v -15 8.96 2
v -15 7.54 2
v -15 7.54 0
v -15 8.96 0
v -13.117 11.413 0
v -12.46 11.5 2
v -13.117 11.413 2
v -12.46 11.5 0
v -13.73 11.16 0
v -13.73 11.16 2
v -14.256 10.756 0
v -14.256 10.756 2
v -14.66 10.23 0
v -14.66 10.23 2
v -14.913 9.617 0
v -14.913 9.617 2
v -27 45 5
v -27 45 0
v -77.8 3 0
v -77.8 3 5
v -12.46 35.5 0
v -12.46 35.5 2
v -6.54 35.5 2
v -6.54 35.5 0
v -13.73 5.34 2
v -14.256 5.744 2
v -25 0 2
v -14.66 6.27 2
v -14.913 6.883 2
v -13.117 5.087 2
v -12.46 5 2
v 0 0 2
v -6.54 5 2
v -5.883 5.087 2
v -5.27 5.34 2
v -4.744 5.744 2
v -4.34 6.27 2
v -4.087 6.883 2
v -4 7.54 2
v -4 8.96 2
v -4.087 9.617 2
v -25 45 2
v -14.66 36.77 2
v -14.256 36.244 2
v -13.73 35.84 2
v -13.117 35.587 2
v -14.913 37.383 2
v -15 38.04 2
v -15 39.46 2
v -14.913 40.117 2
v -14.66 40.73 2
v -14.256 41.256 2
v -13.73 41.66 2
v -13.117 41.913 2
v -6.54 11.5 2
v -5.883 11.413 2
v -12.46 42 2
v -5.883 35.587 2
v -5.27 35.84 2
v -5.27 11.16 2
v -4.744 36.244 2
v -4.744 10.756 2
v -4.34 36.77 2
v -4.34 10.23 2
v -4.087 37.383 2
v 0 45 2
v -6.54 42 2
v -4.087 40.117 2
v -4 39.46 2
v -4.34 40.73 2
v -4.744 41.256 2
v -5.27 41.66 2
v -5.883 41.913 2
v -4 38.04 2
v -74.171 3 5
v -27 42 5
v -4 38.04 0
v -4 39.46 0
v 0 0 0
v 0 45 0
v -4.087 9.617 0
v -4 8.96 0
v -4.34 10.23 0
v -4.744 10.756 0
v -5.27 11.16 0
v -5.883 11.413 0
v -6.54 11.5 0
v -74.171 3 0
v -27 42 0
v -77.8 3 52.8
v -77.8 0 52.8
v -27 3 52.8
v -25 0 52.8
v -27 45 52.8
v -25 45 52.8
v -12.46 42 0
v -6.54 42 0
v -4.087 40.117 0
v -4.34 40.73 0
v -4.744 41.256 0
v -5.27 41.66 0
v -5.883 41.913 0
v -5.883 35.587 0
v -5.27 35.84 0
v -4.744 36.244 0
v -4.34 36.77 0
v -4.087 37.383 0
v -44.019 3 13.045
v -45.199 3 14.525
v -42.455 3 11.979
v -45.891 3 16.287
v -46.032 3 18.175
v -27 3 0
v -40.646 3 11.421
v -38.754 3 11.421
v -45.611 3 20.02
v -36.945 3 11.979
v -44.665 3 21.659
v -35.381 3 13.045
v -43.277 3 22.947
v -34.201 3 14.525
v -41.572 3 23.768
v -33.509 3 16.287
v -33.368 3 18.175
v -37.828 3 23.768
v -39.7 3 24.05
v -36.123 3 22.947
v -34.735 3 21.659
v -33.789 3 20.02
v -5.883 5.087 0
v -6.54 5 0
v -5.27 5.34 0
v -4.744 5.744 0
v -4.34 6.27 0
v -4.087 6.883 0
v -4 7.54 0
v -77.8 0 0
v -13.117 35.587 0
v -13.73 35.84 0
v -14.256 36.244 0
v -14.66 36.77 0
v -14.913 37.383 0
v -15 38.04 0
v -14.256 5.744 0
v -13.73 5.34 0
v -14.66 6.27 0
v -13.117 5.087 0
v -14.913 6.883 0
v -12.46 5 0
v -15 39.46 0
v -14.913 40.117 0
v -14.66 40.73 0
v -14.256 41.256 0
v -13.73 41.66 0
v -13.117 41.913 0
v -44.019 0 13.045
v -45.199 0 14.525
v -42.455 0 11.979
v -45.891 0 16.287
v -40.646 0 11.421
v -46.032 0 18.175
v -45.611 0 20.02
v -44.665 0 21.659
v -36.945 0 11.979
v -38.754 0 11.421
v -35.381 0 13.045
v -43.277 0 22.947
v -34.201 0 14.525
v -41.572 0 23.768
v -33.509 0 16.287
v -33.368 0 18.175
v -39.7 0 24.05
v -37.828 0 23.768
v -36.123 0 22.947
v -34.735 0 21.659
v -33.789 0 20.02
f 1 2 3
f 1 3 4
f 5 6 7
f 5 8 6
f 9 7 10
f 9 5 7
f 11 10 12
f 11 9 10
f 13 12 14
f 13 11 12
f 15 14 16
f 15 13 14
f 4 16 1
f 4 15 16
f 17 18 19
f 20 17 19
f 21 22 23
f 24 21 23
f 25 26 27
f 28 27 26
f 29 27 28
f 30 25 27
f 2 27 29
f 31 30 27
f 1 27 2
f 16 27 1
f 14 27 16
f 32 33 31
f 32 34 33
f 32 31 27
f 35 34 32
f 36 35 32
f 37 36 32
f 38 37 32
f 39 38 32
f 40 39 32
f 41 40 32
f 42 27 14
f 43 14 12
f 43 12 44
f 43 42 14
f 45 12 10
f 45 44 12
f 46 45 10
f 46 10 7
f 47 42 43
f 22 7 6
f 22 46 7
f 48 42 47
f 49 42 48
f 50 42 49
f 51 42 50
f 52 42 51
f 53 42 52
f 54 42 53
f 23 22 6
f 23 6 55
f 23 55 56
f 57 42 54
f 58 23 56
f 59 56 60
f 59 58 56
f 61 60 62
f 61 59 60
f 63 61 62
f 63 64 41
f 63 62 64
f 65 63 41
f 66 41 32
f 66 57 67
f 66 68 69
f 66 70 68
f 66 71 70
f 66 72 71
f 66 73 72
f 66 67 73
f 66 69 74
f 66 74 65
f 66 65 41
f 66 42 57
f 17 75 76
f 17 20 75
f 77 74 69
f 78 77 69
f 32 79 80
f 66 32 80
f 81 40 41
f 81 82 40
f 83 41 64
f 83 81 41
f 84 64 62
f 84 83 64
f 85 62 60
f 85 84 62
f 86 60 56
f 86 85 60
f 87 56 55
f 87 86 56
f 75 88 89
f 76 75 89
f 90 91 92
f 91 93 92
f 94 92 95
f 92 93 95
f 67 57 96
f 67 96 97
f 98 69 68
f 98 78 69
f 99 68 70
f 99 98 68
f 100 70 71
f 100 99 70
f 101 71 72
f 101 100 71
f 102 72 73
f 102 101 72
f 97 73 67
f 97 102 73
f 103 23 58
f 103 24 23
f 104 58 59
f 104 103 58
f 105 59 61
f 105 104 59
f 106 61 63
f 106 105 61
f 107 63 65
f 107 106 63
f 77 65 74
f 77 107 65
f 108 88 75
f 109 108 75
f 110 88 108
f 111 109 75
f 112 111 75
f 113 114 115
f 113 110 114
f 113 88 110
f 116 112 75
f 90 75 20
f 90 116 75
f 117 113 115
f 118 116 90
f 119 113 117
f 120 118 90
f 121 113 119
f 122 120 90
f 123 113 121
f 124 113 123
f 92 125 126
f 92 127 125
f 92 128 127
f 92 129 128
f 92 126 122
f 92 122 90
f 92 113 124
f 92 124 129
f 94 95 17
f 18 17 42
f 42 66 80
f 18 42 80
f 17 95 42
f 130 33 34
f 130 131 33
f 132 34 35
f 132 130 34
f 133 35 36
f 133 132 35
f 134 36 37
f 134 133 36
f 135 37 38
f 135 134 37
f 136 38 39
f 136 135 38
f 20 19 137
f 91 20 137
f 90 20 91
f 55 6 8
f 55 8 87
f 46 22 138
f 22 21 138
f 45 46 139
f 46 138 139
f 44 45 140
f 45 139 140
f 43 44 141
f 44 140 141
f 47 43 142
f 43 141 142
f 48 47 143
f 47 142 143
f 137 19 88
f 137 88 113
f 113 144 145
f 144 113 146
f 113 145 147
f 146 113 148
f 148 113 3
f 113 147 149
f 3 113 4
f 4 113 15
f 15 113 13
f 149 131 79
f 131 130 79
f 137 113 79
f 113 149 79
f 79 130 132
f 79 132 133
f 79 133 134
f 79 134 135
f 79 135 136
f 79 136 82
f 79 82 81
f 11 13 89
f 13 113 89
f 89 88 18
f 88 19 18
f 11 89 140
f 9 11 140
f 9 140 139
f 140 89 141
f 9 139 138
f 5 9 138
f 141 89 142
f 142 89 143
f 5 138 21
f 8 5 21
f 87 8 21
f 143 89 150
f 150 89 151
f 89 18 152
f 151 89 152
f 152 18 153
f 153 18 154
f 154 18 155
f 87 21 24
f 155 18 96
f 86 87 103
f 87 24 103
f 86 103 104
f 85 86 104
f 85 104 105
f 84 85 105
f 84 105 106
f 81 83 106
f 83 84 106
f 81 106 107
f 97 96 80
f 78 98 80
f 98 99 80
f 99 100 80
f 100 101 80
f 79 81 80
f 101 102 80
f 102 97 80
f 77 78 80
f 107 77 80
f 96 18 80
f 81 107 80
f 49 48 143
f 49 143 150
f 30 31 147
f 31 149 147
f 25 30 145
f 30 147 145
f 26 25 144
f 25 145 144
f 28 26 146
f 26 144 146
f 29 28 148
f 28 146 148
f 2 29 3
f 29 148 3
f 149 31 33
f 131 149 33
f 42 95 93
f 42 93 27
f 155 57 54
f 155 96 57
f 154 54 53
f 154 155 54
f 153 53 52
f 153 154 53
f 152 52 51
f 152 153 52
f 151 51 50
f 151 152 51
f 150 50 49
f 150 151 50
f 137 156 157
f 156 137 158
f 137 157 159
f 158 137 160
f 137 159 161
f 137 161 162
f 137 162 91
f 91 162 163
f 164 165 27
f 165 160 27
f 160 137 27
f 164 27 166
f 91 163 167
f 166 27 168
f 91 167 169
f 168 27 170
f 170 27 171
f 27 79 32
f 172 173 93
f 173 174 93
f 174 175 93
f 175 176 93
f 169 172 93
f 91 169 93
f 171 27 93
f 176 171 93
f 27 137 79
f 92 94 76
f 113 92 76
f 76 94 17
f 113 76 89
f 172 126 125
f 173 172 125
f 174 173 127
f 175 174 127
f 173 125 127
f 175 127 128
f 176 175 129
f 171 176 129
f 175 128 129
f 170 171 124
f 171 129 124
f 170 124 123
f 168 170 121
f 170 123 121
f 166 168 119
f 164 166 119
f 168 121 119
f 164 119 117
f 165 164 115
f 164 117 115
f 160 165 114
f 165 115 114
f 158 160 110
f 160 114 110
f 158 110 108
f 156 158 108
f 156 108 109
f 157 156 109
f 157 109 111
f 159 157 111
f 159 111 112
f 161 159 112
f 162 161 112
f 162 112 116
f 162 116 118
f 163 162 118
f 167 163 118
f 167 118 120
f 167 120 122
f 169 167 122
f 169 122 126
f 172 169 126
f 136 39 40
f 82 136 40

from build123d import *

# Parameters (mm, degrees)
SKETCH1_W           = 25
SKETCH1_H           = 45
BOSS_EXTRUDE1_DEPTH = 2
SKETCH2_W           = 11
SKETCH2_H           = 6.5
CUT_EXTRUDE1_DEPTH  = 19.78
FILLET1_R           = 2.54
BOSS_EXTRUDE5_DEPTH = 2
SKETCH10_W          = 52.8
SKETCH10_H          = 3
BOSS_EXTRUDE6_DEPTH = 50.8
BOSS_EXTRUDE7_DEPTH = 5
SKETCH12_R          = 6.35
CUT_EXTRUDE4_DEPTH  = 5


with BuildPart() as part:
    # Sketch1 → Boss-Extrude1 (new body)
    with BuildSketch(Plane.XY):
        with Locations((-12.5, 22.5)):
            Rectangle(SKETCH1_W, SKETCH1_H)
    extrude(amount=BOSS_EXTRUDE1_DEPTH)

    # Sketch2 → Cut-Extrude1 (cut)
    with BuildSketch(Plane.XY.offset(2)):
        with Locations((-9.5, 8.25)):
            Rectangle(SKETCH2_W, SKETCH2_H)
        with Locations((-9.5, 38.75)):
            Rectangle(SKETCH2_W, SKETCH2_H)
    extrude(amount=-CUT_EXTRUDE1_DEPTH, mode=Mode.SUBTRACT)

    # Fillet1
    fillet1_edges = [part.edges().sort_by_distance(p)[0] for p in [
        (-15, 11.5, 1),
        (-4, 11.5, 1),
        (-4, 5, 1),
        (-15, 5, 1),
        (-15, 42, 1),
        (-4, 42, 1),
        (-4, 35.5, 1),
        (-15, 35.5, 1),
    ]]
    fillet(fillet1_edges, radius=FILLET1_R)

    # Sketch9 → Boss-Extrude5 (add)
    with BuildSketch(Plane.ZY.offset(25)):
        Polygon((0, 45), (2, 45), (52.8, 45), (52.8, 0), (2, 0), (0, 0), align=None)
    extrude(amount=BOSS_EXTRUDE5_DEPTH)

    # Sketch10 → Boss-Extrude6 (add)
    with BuildSketch(Plane.ZY.offset(27)):
        with Locations((26.4, 1.5)):
            Rectangle(SKETCH10_W, SKETCH10_H)
    extrude(amount=BOSS_EXTRUDE6_DEPTH)

    # Sketch11 → Boss-Extrude7 (add)
    with BuildSketch(Plane(origin=(0, 0, 0), x_dir=(-1, 0, 0), z_dir=(0, 0, -1))):
        Polygon((27, 45), (77.8, 3), (77.8, 0), (27, 42), align=None)
    extrude(amount=-BOSS_EXTRUDE7_DEPTH)

    # Sketch12 → Cut-Extrude4 (cut)
    with BuildSketch(Plane(origin=(0, 3, 0), x_dir=(1, 0, 0), z_dir=(0, 1, 0))):
        with Locations(Location((-39.7, -17.7, 0), (0, 0, 270))):
            Circle(SKETCH12_R)
    extrude(amount=-CUT_EXTRUDE4_DEPTH, mode=Mode.SUBTRACT)


solid = part.part
